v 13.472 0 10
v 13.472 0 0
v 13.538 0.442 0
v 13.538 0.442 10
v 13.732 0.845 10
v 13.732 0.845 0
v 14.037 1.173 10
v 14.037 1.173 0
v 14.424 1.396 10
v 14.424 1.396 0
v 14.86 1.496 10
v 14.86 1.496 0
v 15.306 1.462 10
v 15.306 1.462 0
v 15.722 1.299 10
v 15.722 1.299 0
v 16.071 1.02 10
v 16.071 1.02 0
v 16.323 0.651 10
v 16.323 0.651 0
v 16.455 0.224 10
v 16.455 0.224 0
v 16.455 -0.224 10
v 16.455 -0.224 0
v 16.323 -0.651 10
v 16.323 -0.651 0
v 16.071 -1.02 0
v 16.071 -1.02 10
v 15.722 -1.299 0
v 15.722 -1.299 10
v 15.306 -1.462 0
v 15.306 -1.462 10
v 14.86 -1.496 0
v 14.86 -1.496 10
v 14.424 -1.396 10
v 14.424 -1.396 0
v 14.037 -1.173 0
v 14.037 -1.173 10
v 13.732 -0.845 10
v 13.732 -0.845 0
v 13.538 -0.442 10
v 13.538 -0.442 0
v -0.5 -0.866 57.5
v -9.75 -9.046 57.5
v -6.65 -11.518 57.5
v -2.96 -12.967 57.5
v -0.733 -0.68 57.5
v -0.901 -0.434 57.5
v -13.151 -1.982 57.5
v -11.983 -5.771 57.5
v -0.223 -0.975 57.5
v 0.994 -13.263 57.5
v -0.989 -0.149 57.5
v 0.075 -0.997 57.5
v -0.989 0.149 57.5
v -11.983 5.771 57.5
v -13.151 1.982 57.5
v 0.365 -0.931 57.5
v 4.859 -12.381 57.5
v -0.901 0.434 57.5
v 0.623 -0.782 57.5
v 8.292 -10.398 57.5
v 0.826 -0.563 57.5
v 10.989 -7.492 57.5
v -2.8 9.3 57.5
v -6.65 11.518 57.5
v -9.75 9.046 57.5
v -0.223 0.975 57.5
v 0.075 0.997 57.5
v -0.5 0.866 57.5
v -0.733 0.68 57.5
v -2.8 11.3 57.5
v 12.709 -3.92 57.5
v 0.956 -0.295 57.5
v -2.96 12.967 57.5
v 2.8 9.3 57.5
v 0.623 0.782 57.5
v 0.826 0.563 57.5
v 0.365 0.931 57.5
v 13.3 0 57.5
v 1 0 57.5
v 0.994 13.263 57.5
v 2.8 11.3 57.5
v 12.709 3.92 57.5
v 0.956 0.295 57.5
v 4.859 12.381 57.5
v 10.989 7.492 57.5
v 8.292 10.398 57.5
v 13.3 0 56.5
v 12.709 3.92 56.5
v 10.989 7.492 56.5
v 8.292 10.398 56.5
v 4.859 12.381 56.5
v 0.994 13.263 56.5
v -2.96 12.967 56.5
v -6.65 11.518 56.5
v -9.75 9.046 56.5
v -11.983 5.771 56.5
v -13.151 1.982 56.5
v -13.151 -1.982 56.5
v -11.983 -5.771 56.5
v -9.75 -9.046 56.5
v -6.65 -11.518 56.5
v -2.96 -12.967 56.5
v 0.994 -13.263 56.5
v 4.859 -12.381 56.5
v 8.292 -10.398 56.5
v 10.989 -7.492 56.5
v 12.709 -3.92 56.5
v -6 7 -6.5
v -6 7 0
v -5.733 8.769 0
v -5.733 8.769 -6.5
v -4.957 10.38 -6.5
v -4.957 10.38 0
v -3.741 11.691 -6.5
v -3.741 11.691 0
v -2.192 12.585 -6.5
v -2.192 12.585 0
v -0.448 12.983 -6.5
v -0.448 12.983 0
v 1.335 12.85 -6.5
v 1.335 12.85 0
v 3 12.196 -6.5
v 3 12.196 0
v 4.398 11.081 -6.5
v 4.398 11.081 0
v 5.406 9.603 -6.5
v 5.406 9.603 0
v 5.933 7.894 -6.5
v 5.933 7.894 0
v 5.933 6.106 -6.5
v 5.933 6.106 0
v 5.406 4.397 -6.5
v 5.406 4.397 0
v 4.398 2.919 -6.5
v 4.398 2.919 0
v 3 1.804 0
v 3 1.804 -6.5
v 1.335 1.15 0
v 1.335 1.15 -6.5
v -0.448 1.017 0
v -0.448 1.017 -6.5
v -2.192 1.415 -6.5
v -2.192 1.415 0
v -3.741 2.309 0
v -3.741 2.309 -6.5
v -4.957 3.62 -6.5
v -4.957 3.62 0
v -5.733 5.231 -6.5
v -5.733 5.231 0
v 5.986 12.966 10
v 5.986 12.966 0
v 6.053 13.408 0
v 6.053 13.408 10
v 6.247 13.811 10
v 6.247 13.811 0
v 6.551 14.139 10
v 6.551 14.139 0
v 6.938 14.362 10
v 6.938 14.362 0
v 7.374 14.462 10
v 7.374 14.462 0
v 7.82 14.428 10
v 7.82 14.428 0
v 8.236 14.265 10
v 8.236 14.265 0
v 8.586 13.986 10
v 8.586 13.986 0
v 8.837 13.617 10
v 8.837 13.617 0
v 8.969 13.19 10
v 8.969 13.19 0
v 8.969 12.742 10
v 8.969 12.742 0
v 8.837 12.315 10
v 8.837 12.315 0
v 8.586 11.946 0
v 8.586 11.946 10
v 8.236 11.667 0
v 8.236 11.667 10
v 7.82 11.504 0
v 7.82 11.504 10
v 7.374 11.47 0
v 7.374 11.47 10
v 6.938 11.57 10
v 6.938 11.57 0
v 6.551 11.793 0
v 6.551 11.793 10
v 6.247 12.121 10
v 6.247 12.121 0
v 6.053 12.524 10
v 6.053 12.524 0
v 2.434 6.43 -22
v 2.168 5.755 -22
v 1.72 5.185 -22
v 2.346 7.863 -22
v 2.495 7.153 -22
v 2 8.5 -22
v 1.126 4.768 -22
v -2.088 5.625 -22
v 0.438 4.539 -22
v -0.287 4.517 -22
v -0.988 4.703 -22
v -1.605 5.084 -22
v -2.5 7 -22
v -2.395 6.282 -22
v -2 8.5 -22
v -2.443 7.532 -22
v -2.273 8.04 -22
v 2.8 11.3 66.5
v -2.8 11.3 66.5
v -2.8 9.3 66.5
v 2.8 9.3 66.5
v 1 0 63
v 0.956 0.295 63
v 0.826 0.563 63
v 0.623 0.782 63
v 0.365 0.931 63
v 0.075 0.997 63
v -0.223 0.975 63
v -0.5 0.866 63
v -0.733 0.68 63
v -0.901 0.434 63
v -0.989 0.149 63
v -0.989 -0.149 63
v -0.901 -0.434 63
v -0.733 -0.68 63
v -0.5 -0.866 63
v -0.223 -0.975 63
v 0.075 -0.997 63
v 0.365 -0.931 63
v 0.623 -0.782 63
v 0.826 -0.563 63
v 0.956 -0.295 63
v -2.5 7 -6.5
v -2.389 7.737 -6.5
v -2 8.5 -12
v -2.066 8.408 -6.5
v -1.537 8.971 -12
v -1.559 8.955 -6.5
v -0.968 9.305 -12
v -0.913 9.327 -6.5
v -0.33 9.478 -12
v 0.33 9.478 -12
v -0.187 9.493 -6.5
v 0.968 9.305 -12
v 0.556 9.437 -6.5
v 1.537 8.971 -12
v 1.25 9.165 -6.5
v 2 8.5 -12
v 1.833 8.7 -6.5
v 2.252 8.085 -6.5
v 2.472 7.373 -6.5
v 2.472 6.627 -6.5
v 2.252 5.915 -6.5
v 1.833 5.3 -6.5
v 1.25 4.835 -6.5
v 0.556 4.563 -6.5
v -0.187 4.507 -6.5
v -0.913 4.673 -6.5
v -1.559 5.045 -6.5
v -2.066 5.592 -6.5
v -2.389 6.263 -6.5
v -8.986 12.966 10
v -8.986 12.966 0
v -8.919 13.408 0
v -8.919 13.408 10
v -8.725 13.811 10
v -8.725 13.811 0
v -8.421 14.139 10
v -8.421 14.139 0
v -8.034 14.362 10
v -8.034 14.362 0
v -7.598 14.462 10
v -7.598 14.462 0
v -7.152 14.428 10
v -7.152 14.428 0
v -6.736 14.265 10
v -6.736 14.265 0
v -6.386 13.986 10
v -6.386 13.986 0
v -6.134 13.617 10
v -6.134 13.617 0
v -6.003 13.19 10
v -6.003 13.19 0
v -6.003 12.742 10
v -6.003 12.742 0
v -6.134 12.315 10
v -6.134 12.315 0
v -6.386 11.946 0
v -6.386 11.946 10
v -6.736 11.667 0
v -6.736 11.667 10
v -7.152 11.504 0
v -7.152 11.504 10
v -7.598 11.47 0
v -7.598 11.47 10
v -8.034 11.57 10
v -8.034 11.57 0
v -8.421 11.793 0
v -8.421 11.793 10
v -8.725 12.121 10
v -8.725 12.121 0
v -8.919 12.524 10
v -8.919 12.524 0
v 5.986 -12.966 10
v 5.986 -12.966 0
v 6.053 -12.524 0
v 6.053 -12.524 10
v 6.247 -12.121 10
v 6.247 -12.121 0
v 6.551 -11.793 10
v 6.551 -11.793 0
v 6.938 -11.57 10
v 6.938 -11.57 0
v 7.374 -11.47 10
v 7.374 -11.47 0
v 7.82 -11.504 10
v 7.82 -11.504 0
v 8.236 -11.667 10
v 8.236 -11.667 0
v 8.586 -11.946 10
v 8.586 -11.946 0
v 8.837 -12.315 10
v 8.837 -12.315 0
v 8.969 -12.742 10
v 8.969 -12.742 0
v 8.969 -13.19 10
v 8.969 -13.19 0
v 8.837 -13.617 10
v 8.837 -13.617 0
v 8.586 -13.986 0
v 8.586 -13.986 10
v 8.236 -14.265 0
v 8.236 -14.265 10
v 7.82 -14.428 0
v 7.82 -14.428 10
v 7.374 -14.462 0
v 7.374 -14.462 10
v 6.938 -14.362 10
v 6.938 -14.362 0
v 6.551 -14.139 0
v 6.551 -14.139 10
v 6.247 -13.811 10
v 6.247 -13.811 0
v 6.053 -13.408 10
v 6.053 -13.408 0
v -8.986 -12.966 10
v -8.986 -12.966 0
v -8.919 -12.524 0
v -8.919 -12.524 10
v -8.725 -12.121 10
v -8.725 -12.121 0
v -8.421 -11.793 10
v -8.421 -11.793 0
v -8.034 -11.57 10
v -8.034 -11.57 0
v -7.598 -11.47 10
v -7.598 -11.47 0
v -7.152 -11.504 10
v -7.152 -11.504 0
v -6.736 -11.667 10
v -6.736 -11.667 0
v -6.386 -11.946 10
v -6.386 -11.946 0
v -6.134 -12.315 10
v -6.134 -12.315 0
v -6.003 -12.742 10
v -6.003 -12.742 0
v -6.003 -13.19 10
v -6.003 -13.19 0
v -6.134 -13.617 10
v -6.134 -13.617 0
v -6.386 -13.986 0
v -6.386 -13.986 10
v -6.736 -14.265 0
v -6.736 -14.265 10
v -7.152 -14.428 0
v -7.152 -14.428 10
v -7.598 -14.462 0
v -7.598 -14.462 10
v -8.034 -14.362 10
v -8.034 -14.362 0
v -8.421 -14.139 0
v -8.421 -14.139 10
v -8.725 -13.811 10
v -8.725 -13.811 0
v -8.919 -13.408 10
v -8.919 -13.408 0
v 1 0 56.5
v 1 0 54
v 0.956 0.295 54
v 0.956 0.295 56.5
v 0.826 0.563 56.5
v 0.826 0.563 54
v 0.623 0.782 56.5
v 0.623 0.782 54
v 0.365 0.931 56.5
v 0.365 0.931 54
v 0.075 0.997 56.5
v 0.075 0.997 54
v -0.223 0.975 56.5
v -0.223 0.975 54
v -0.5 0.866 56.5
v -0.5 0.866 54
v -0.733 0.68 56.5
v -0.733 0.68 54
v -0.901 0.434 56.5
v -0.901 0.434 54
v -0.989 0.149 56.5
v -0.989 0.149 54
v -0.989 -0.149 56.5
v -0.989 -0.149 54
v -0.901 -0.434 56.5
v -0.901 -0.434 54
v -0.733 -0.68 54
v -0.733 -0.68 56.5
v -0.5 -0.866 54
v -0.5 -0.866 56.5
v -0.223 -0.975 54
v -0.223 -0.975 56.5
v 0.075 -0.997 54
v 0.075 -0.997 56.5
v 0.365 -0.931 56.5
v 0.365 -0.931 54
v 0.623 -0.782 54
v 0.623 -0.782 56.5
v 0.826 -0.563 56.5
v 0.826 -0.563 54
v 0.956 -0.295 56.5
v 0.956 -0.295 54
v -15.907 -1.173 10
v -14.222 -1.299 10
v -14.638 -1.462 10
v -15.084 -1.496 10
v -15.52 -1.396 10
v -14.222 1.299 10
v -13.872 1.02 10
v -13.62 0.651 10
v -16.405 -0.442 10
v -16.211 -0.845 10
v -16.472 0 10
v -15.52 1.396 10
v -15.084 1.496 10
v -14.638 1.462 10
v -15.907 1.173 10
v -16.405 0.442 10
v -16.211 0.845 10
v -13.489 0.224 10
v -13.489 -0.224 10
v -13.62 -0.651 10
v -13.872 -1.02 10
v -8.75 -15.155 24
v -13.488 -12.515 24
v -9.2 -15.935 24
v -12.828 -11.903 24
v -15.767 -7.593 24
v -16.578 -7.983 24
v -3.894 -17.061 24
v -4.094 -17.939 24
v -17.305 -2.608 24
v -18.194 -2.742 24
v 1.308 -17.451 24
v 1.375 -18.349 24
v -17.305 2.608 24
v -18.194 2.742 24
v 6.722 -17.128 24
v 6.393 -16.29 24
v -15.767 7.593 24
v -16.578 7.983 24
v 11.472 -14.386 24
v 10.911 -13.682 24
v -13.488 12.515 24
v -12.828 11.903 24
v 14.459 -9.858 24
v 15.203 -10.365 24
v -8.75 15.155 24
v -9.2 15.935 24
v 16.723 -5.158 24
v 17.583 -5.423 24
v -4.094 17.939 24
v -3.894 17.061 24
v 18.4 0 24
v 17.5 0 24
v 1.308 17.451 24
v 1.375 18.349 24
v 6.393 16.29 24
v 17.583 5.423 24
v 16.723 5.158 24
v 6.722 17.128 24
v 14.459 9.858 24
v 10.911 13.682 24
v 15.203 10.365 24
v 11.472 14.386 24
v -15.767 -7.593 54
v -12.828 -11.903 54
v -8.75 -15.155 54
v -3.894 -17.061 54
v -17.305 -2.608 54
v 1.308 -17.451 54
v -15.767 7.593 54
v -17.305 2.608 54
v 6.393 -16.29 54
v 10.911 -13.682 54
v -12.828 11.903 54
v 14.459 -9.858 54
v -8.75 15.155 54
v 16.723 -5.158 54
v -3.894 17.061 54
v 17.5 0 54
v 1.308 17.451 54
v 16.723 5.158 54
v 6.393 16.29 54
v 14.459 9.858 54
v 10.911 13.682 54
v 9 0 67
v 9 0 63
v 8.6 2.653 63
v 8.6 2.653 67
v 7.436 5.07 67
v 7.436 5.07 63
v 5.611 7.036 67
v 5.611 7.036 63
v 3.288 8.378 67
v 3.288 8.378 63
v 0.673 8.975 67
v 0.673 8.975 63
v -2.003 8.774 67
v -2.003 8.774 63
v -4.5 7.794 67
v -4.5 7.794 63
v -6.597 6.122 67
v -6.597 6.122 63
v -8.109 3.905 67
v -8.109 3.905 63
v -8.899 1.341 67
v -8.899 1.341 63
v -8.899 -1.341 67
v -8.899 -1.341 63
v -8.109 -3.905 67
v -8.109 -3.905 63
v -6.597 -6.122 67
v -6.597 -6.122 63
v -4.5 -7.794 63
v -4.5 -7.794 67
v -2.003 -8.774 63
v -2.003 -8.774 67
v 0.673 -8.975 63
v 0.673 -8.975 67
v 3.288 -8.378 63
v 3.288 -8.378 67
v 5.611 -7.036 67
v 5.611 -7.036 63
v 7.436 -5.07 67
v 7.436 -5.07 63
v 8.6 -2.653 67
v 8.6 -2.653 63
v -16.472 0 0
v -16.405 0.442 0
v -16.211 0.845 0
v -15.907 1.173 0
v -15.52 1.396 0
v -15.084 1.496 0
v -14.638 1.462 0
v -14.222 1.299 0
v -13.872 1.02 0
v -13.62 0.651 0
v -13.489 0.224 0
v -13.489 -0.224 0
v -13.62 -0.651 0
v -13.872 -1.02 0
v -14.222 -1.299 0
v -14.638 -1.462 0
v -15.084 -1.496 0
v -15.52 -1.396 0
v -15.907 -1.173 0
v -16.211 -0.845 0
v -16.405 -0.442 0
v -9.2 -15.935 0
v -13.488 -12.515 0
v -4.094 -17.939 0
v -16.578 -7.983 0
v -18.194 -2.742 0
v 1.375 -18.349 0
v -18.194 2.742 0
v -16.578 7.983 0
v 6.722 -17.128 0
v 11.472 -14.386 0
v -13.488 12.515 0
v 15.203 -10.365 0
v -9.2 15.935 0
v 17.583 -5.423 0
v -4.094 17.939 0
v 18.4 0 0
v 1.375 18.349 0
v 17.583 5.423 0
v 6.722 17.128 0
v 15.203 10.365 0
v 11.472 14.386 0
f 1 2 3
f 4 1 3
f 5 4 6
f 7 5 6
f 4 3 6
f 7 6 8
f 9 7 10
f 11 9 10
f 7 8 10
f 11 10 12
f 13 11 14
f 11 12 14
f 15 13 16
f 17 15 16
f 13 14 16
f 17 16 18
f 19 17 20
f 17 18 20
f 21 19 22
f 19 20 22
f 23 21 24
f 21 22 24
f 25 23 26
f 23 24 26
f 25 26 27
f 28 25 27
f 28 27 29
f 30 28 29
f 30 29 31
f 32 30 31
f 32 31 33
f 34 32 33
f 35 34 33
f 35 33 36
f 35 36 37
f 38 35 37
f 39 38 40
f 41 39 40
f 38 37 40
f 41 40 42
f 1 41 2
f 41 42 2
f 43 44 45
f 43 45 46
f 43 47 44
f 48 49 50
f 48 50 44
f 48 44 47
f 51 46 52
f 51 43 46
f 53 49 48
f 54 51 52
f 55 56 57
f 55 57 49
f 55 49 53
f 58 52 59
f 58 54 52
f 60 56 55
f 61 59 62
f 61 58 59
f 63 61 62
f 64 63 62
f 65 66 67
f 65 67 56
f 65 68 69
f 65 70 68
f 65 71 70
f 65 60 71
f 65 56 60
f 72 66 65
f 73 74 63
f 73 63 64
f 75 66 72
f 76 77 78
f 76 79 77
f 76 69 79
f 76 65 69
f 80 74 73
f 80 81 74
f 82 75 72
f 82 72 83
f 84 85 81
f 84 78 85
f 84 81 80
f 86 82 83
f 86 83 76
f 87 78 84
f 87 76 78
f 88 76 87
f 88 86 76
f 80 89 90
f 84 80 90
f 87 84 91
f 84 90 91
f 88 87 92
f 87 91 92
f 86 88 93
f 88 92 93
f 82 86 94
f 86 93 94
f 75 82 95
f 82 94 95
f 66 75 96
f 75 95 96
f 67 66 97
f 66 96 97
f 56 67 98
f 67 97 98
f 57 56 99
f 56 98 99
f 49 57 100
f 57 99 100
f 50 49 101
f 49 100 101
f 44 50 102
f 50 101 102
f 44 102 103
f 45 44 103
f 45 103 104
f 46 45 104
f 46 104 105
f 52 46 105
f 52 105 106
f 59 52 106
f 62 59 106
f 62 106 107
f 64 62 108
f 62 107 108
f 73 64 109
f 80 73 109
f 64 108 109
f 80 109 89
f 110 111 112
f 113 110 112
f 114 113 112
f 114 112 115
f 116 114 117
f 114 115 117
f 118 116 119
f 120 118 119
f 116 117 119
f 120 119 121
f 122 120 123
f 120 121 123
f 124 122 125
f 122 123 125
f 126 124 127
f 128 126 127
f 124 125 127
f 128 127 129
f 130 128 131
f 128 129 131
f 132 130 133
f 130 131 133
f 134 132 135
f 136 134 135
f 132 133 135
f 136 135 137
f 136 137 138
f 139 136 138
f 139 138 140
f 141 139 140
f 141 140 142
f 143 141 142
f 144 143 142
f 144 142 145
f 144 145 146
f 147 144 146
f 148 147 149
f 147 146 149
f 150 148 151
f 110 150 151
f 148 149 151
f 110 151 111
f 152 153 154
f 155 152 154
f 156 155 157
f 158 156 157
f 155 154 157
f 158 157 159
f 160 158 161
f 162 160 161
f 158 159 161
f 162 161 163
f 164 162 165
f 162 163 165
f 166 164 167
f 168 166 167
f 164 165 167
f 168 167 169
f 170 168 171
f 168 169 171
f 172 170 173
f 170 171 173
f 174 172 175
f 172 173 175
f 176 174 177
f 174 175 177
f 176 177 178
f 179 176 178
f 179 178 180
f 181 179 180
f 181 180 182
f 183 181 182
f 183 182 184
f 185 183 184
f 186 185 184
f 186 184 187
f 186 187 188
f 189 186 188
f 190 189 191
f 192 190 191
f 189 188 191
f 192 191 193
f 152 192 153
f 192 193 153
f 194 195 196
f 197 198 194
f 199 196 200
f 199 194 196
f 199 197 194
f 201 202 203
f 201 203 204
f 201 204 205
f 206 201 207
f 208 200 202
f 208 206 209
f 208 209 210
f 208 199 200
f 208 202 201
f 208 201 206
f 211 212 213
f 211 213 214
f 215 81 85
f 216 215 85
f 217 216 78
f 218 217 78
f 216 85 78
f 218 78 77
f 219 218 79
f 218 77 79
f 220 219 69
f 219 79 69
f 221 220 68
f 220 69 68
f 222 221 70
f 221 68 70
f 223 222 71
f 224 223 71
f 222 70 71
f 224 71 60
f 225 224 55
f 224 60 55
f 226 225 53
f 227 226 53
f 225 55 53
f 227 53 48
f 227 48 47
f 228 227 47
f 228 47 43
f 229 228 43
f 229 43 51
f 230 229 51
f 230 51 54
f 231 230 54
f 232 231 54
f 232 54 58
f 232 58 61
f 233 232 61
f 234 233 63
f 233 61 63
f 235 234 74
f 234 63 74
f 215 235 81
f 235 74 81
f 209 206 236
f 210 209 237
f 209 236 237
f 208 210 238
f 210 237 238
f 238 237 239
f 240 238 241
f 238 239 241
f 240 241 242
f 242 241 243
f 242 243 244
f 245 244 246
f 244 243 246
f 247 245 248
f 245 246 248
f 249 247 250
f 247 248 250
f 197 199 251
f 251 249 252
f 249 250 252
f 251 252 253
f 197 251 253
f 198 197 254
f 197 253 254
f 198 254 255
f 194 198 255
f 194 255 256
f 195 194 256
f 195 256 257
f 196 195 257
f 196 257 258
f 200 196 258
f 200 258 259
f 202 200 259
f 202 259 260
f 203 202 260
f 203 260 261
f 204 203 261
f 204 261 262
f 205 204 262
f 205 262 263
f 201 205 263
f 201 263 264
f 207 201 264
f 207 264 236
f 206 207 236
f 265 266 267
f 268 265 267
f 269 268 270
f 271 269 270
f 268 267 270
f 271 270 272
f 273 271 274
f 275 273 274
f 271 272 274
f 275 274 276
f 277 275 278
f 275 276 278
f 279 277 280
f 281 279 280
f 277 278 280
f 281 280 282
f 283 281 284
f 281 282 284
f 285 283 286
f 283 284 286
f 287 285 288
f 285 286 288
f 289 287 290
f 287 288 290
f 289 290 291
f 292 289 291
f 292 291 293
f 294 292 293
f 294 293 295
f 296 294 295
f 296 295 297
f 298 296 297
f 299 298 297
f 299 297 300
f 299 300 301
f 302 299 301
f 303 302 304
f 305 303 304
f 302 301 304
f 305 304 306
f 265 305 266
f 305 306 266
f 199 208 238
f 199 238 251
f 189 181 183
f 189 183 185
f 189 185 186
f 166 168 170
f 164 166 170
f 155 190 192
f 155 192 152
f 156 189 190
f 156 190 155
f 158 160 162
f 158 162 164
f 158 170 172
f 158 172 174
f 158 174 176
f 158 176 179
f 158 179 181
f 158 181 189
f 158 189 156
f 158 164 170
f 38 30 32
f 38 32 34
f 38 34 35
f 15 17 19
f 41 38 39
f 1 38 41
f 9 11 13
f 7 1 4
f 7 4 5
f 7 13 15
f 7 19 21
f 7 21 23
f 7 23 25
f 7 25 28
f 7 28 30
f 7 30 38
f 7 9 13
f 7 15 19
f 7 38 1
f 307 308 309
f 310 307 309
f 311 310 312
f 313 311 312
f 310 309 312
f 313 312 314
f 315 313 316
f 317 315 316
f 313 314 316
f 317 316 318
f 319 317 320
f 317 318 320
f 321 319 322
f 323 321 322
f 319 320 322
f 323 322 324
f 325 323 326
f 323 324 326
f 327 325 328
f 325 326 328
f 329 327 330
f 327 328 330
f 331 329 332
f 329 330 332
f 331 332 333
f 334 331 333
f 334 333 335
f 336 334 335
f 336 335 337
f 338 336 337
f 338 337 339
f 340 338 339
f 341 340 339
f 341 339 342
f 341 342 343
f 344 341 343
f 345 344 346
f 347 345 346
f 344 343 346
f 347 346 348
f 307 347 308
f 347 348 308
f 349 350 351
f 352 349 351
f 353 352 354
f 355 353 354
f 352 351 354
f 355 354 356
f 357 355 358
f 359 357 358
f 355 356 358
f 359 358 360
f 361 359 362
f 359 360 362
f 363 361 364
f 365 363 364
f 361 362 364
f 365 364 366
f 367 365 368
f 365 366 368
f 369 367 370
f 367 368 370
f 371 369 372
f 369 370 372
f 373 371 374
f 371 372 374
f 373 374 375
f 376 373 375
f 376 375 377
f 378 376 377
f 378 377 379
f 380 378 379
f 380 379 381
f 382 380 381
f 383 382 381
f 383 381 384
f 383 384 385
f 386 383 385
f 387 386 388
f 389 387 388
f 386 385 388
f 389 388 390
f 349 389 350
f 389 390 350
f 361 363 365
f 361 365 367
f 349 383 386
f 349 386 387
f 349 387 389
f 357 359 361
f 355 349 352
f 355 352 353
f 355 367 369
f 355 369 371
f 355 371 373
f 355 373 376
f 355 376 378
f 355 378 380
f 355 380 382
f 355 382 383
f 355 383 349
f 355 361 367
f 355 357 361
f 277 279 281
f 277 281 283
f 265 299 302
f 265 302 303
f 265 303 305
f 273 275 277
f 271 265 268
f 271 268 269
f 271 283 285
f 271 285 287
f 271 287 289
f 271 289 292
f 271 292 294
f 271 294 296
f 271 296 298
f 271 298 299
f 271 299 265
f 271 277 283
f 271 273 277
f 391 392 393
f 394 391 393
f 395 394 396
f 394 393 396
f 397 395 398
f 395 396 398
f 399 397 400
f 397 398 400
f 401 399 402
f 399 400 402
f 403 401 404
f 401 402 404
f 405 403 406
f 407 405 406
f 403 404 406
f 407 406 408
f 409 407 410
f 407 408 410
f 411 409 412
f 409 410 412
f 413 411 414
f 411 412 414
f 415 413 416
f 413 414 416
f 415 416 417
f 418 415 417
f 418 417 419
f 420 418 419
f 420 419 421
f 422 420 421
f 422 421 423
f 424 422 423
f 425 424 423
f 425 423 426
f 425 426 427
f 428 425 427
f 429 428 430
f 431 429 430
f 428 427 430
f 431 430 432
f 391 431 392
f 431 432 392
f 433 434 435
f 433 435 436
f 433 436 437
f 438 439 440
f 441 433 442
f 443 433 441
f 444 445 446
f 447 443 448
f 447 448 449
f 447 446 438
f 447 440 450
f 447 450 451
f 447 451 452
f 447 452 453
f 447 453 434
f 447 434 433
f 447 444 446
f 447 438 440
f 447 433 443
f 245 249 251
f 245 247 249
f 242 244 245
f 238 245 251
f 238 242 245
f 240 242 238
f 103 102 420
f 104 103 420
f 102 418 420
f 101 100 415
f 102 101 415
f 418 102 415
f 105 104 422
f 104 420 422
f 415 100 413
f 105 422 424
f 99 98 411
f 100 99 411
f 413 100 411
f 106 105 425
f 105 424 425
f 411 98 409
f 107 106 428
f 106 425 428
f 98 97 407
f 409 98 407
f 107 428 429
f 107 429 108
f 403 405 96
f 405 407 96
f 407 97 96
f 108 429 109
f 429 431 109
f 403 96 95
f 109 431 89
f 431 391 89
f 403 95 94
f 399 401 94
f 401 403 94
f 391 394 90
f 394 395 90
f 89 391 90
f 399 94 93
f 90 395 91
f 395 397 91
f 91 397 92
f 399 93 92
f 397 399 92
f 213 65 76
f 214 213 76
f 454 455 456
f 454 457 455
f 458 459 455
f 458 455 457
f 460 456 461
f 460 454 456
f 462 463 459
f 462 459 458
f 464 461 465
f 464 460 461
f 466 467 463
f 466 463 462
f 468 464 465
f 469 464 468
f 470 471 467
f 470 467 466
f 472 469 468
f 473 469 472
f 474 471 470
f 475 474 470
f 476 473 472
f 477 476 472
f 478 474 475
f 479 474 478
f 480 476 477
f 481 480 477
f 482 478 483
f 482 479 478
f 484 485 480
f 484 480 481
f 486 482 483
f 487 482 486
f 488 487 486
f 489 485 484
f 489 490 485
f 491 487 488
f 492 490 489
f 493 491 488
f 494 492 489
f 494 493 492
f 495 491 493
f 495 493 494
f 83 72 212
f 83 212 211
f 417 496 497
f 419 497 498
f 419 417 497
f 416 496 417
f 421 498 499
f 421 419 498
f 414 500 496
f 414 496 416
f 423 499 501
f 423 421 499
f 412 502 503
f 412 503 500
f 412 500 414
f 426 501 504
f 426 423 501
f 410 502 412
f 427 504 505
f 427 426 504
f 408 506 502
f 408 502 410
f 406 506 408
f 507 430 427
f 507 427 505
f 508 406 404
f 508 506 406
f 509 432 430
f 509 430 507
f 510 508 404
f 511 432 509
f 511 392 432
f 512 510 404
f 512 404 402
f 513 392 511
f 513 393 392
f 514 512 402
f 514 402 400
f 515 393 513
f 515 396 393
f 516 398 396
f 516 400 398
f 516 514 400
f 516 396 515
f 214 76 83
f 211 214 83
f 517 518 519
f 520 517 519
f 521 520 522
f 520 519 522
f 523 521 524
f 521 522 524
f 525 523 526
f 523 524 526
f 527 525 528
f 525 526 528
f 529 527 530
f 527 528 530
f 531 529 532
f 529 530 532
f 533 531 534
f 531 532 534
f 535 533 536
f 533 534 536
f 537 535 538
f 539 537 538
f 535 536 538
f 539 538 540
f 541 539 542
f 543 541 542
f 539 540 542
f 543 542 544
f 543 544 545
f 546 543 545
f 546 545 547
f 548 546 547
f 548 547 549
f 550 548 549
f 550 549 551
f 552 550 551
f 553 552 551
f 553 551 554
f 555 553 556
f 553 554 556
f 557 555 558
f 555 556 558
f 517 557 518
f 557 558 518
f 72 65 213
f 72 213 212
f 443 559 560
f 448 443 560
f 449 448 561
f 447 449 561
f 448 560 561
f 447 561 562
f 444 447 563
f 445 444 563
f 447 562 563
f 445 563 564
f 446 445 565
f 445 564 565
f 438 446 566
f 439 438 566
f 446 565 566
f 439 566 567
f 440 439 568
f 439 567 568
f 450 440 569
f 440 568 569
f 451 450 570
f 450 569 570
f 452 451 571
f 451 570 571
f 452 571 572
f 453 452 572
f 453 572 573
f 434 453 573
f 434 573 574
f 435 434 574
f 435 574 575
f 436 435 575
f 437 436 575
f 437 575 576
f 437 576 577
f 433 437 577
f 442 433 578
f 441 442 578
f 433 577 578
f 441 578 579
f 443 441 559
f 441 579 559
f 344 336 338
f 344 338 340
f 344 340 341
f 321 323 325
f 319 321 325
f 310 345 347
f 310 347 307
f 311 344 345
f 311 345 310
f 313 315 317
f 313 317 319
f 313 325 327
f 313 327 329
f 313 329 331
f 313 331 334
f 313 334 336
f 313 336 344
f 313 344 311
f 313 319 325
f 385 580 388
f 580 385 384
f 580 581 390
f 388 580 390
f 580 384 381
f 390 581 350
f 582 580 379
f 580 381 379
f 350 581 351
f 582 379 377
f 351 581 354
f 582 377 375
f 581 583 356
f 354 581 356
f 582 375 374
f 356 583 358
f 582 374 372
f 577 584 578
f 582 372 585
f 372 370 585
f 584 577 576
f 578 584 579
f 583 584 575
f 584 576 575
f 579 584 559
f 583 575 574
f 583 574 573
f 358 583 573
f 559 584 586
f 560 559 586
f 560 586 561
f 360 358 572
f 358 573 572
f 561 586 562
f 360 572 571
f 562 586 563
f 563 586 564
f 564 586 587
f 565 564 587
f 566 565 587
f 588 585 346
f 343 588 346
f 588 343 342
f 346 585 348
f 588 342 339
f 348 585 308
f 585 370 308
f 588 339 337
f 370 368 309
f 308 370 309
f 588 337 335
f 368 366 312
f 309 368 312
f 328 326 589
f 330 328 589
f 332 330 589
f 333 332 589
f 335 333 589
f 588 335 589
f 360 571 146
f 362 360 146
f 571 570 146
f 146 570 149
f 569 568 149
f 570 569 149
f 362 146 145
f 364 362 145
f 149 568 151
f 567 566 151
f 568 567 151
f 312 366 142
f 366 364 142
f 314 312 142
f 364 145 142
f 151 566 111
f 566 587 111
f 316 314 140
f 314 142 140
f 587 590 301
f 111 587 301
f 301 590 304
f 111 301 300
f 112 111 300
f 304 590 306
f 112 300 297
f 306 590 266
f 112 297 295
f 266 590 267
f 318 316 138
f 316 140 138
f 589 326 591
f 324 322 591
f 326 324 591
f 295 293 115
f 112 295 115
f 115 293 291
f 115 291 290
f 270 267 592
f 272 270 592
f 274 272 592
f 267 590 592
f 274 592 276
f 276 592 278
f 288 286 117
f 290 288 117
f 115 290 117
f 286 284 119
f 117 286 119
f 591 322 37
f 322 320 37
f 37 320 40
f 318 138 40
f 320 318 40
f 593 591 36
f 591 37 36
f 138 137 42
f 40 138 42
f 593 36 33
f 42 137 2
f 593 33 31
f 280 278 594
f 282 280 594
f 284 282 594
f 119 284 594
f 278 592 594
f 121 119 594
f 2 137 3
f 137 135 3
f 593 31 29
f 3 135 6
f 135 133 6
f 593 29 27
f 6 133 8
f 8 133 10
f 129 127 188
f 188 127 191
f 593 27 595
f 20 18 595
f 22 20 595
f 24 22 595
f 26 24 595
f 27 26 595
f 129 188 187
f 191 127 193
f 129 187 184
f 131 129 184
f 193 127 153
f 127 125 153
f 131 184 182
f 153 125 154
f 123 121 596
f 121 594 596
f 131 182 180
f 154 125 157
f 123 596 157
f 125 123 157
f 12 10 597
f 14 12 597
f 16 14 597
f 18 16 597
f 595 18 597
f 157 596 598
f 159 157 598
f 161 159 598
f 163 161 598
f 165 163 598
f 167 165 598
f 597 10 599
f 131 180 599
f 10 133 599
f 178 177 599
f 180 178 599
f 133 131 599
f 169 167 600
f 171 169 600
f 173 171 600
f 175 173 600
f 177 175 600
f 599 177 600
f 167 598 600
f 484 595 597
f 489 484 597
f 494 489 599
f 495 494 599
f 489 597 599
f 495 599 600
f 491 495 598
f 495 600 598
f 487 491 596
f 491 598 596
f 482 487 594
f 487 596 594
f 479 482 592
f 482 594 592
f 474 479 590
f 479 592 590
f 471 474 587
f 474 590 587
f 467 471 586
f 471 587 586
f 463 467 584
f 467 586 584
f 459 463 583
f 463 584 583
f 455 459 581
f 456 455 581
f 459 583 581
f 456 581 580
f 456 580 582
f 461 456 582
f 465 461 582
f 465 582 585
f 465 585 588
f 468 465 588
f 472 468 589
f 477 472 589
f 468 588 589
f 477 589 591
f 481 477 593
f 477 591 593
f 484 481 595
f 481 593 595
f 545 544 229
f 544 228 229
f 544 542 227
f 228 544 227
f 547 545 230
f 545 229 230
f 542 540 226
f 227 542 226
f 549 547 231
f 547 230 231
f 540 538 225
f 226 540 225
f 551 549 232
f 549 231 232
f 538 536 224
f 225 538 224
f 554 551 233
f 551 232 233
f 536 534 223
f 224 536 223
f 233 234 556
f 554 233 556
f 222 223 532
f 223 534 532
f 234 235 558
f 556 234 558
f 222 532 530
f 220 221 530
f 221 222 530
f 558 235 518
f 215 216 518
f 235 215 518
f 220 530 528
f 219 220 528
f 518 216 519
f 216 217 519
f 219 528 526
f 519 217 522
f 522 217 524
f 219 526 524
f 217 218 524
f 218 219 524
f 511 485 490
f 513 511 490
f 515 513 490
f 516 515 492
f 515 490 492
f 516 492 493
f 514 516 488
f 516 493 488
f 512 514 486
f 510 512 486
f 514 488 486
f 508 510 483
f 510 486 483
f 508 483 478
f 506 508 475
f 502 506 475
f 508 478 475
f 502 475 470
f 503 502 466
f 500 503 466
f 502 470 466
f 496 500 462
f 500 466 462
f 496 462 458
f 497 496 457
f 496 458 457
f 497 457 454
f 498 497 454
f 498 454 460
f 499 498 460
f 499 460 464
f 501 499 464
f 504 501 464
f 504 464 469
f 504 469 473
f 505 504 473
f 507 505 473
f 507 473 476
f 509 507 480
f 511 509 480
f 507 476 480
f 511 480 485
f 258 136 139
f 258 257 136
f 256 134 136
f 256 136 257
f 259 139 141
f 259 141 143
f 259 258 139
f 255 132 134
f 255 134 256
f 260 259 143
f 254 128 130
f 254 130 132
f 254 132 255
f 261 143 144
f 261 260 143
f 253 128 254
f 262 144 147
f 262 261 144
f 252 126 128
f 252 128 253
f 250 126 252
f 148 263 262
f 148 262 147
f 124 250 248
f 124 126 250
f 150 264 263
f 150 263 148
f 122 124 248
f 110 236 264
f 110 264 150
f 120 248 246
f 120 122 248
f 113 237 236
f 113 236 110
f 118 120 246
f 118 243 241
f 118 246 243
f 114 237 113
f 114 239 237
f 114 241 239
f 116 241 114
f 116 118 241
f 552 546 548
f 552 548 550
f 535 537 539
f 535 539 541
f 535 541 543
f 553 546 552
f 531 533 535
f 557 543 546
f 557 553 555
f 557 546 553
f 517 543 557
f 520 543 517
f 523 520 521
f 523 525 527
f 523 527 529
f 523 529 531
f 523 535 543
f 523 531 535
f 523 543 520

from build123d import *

# Parameters (mm, degrees)
ESBO_O1_R                 = 18.4
RESSALTO_EXTRUS_O1_DEPTH  = 24
ESBO_O2_R                 = 17.5
RESSALTO_EXTRUS_O2_DEPTH  = 30
ESBO_O3_R                 = 6
RESSALTO_EXTRUS_O3_DEPTH  = 6.5
ESBO_O4_R                 = 2.5
RESSALTO_EXTRUS_O4_DEPTH  = 15.5
ESBO_O5_R                 = 1.5
CORTE_EXTRUS_O1_DEPTH     = 10
ESBO_O6_R                 = 1
RESSALTO_EXTRUS_O5_DEPTH  = 2.5
ESBO_O8_R                 = 13.3
RESSALTO_EXTRUS_O7_DEPTH  = 1
ESBO_O9_R                 = 1
RESSALTO_EXTRUS_O8_DEPTH  = 5.5
ESBO_O10_R                = 9
RESSALTO_EXTRUS_O9_DEPTH  = 4
ESBO_O11_W                = 5.6
ESBO_O11_H                = 2
RESSALTO_EXTRUS_O10_DEPTH = 9
ESBO_O12_OUTSIDE_W        = 59.42
ESBO_O12_OUTSIDE_H        = 59.42
CORTE_EXTRUS_O2_DEPTH     = 10


with BuildPart() as part:
    # Esboço1 → Ressalto-extrusão1 (new body)
    with BuildSketch(Plane.XY):
        Circle(ESBO_O1_R)
    extrude(amount=RESSALTO_EXTRUS_O1_DEPTH)

    # Esboço2 → Ressalto-extrusão2 (add)
    with BuildSketch(Plane.XY.offset(24)):
        Circle(ESBO_O2_R)
    extrude(amount=RESSALTO_EXTRUS_O2_DEPTH)

    # Esboço3 → Ressalto-extrusão3 (add)
    with BuildSketch(Plane(origin=(0, 0, 0), x_dir=(-1, 0, 0), z_dir=(0, 0, -1))):
        with Locations((0, 7)):
            Circle(ESBO_O3_R)
    extrude(amount=RESSALTO_EXTRUS_O3_DEPTH)

    # Esboço4 → Ressalto-extrusão4 (add)
    with BuildSketch(Plane(origin=(0, 0, -6.5), x_dir=(-1, 0, 0), z_dir=(0, 0, -1))):
        with Locations((0, 7)):
            Circle(ESBO_O4_R)
    extrude(amount=RESSALTO_EXTRUS_O4_DEPTH)

    # Esboço5 → Corte-extrusão1 (cut)
    with BuildSketch(Plane(origin=(0, 0, 0), x_dir=(-1, 0, 0), z_dir=(0, 0, -1))):
        with Locations((7.485925154, 12.966002708)):
            Circle(ESBO_O5_R)
        with Locations((14.971850307, 0)):
            Circle(ESBO_O5_R)
        with Locations((7.485925154, -12.966002708)):
            Circle(ESBO_O5_R)
        with Locations((-7.485925154, -12.966002708)):
            Circle(ESBO_O5_R)
        with Locations((-14.971850307, 0)):
            Circle(ESBO_O5_R)
        with Locations((-7.485925154, 12.966002708)):
            Circle(ESBO_O5_R)
    extrude(amount=-CORTE_EXTRUS_O1_DEPTH, mode=Mode.SUBTRACT)

    # Esboço6 → Ressalto-extrusão5 (add)
    with BuildSketch(Plane.XY.offset(54)):
        Circle(ESBO_O6_R)
    extrude(amount=RESSALTO_EXTRUS_O5_DEPTH)

    # Esboço8 → Ressalto-extrusão7 (add)
    with BuildSketch(Plane.XY.offset(56.5)):
        Circle(ESBO_O8_R)
    extrude(amount=RESSALTO_EXTRUS_O7_DEPTH)

    # Esboço9 → Ressalto-extrusão8 (add)
    with BuildSketch(Plane.XY.offset(57.5)):
        Circle(ESBO_O9_R)
    extrude(amount=RESSALTO_EXTRUS_O8_DEPTH)

    # Esboço10 → Ressalto-extrusão9 (add)
    with BuildSketch(Plane.XY.offset(63)):
        Circle(ESBO_O10_R)
    extrude(amount=RESSALTO_EXTRUS_O9_DEPTH)

    # Esboço11 → Ressalto-extrusão10 (add)
    with BuildSketch(Plane.XY.offset(57.5)):
        with Locations((0, 10.3)):
            Rectangle(ESBO_O11_W, ESBO_O11_H)
    extrude(amount=RESSALTO_EXTRUS_O10_DEPTH)

    # Esboço12 outside → Corte-extrusão2 (cut)
    with BuildSketch(Plane(origin=(0, 0, -22), x_dir=(-1, 0, 0), z_dir=(0, 0, -1))):
        Rectangle(ESBO_O12_OUTSIDE_W, ESBO_O12_OUTSIDE_H)
        with BuildLine():
            Line((2, 8.5), (-2, 8.5))
            ThreePointArc((-2, 8.5), (0, 4.5), (2, 8.5))
        make_face(mode=Mode.SUBTRACT)
    extrude(amount=-CORTE_EXTRUS_O2_DEPTH, mode=Mode.SUBTRACT)


solid = part.part
